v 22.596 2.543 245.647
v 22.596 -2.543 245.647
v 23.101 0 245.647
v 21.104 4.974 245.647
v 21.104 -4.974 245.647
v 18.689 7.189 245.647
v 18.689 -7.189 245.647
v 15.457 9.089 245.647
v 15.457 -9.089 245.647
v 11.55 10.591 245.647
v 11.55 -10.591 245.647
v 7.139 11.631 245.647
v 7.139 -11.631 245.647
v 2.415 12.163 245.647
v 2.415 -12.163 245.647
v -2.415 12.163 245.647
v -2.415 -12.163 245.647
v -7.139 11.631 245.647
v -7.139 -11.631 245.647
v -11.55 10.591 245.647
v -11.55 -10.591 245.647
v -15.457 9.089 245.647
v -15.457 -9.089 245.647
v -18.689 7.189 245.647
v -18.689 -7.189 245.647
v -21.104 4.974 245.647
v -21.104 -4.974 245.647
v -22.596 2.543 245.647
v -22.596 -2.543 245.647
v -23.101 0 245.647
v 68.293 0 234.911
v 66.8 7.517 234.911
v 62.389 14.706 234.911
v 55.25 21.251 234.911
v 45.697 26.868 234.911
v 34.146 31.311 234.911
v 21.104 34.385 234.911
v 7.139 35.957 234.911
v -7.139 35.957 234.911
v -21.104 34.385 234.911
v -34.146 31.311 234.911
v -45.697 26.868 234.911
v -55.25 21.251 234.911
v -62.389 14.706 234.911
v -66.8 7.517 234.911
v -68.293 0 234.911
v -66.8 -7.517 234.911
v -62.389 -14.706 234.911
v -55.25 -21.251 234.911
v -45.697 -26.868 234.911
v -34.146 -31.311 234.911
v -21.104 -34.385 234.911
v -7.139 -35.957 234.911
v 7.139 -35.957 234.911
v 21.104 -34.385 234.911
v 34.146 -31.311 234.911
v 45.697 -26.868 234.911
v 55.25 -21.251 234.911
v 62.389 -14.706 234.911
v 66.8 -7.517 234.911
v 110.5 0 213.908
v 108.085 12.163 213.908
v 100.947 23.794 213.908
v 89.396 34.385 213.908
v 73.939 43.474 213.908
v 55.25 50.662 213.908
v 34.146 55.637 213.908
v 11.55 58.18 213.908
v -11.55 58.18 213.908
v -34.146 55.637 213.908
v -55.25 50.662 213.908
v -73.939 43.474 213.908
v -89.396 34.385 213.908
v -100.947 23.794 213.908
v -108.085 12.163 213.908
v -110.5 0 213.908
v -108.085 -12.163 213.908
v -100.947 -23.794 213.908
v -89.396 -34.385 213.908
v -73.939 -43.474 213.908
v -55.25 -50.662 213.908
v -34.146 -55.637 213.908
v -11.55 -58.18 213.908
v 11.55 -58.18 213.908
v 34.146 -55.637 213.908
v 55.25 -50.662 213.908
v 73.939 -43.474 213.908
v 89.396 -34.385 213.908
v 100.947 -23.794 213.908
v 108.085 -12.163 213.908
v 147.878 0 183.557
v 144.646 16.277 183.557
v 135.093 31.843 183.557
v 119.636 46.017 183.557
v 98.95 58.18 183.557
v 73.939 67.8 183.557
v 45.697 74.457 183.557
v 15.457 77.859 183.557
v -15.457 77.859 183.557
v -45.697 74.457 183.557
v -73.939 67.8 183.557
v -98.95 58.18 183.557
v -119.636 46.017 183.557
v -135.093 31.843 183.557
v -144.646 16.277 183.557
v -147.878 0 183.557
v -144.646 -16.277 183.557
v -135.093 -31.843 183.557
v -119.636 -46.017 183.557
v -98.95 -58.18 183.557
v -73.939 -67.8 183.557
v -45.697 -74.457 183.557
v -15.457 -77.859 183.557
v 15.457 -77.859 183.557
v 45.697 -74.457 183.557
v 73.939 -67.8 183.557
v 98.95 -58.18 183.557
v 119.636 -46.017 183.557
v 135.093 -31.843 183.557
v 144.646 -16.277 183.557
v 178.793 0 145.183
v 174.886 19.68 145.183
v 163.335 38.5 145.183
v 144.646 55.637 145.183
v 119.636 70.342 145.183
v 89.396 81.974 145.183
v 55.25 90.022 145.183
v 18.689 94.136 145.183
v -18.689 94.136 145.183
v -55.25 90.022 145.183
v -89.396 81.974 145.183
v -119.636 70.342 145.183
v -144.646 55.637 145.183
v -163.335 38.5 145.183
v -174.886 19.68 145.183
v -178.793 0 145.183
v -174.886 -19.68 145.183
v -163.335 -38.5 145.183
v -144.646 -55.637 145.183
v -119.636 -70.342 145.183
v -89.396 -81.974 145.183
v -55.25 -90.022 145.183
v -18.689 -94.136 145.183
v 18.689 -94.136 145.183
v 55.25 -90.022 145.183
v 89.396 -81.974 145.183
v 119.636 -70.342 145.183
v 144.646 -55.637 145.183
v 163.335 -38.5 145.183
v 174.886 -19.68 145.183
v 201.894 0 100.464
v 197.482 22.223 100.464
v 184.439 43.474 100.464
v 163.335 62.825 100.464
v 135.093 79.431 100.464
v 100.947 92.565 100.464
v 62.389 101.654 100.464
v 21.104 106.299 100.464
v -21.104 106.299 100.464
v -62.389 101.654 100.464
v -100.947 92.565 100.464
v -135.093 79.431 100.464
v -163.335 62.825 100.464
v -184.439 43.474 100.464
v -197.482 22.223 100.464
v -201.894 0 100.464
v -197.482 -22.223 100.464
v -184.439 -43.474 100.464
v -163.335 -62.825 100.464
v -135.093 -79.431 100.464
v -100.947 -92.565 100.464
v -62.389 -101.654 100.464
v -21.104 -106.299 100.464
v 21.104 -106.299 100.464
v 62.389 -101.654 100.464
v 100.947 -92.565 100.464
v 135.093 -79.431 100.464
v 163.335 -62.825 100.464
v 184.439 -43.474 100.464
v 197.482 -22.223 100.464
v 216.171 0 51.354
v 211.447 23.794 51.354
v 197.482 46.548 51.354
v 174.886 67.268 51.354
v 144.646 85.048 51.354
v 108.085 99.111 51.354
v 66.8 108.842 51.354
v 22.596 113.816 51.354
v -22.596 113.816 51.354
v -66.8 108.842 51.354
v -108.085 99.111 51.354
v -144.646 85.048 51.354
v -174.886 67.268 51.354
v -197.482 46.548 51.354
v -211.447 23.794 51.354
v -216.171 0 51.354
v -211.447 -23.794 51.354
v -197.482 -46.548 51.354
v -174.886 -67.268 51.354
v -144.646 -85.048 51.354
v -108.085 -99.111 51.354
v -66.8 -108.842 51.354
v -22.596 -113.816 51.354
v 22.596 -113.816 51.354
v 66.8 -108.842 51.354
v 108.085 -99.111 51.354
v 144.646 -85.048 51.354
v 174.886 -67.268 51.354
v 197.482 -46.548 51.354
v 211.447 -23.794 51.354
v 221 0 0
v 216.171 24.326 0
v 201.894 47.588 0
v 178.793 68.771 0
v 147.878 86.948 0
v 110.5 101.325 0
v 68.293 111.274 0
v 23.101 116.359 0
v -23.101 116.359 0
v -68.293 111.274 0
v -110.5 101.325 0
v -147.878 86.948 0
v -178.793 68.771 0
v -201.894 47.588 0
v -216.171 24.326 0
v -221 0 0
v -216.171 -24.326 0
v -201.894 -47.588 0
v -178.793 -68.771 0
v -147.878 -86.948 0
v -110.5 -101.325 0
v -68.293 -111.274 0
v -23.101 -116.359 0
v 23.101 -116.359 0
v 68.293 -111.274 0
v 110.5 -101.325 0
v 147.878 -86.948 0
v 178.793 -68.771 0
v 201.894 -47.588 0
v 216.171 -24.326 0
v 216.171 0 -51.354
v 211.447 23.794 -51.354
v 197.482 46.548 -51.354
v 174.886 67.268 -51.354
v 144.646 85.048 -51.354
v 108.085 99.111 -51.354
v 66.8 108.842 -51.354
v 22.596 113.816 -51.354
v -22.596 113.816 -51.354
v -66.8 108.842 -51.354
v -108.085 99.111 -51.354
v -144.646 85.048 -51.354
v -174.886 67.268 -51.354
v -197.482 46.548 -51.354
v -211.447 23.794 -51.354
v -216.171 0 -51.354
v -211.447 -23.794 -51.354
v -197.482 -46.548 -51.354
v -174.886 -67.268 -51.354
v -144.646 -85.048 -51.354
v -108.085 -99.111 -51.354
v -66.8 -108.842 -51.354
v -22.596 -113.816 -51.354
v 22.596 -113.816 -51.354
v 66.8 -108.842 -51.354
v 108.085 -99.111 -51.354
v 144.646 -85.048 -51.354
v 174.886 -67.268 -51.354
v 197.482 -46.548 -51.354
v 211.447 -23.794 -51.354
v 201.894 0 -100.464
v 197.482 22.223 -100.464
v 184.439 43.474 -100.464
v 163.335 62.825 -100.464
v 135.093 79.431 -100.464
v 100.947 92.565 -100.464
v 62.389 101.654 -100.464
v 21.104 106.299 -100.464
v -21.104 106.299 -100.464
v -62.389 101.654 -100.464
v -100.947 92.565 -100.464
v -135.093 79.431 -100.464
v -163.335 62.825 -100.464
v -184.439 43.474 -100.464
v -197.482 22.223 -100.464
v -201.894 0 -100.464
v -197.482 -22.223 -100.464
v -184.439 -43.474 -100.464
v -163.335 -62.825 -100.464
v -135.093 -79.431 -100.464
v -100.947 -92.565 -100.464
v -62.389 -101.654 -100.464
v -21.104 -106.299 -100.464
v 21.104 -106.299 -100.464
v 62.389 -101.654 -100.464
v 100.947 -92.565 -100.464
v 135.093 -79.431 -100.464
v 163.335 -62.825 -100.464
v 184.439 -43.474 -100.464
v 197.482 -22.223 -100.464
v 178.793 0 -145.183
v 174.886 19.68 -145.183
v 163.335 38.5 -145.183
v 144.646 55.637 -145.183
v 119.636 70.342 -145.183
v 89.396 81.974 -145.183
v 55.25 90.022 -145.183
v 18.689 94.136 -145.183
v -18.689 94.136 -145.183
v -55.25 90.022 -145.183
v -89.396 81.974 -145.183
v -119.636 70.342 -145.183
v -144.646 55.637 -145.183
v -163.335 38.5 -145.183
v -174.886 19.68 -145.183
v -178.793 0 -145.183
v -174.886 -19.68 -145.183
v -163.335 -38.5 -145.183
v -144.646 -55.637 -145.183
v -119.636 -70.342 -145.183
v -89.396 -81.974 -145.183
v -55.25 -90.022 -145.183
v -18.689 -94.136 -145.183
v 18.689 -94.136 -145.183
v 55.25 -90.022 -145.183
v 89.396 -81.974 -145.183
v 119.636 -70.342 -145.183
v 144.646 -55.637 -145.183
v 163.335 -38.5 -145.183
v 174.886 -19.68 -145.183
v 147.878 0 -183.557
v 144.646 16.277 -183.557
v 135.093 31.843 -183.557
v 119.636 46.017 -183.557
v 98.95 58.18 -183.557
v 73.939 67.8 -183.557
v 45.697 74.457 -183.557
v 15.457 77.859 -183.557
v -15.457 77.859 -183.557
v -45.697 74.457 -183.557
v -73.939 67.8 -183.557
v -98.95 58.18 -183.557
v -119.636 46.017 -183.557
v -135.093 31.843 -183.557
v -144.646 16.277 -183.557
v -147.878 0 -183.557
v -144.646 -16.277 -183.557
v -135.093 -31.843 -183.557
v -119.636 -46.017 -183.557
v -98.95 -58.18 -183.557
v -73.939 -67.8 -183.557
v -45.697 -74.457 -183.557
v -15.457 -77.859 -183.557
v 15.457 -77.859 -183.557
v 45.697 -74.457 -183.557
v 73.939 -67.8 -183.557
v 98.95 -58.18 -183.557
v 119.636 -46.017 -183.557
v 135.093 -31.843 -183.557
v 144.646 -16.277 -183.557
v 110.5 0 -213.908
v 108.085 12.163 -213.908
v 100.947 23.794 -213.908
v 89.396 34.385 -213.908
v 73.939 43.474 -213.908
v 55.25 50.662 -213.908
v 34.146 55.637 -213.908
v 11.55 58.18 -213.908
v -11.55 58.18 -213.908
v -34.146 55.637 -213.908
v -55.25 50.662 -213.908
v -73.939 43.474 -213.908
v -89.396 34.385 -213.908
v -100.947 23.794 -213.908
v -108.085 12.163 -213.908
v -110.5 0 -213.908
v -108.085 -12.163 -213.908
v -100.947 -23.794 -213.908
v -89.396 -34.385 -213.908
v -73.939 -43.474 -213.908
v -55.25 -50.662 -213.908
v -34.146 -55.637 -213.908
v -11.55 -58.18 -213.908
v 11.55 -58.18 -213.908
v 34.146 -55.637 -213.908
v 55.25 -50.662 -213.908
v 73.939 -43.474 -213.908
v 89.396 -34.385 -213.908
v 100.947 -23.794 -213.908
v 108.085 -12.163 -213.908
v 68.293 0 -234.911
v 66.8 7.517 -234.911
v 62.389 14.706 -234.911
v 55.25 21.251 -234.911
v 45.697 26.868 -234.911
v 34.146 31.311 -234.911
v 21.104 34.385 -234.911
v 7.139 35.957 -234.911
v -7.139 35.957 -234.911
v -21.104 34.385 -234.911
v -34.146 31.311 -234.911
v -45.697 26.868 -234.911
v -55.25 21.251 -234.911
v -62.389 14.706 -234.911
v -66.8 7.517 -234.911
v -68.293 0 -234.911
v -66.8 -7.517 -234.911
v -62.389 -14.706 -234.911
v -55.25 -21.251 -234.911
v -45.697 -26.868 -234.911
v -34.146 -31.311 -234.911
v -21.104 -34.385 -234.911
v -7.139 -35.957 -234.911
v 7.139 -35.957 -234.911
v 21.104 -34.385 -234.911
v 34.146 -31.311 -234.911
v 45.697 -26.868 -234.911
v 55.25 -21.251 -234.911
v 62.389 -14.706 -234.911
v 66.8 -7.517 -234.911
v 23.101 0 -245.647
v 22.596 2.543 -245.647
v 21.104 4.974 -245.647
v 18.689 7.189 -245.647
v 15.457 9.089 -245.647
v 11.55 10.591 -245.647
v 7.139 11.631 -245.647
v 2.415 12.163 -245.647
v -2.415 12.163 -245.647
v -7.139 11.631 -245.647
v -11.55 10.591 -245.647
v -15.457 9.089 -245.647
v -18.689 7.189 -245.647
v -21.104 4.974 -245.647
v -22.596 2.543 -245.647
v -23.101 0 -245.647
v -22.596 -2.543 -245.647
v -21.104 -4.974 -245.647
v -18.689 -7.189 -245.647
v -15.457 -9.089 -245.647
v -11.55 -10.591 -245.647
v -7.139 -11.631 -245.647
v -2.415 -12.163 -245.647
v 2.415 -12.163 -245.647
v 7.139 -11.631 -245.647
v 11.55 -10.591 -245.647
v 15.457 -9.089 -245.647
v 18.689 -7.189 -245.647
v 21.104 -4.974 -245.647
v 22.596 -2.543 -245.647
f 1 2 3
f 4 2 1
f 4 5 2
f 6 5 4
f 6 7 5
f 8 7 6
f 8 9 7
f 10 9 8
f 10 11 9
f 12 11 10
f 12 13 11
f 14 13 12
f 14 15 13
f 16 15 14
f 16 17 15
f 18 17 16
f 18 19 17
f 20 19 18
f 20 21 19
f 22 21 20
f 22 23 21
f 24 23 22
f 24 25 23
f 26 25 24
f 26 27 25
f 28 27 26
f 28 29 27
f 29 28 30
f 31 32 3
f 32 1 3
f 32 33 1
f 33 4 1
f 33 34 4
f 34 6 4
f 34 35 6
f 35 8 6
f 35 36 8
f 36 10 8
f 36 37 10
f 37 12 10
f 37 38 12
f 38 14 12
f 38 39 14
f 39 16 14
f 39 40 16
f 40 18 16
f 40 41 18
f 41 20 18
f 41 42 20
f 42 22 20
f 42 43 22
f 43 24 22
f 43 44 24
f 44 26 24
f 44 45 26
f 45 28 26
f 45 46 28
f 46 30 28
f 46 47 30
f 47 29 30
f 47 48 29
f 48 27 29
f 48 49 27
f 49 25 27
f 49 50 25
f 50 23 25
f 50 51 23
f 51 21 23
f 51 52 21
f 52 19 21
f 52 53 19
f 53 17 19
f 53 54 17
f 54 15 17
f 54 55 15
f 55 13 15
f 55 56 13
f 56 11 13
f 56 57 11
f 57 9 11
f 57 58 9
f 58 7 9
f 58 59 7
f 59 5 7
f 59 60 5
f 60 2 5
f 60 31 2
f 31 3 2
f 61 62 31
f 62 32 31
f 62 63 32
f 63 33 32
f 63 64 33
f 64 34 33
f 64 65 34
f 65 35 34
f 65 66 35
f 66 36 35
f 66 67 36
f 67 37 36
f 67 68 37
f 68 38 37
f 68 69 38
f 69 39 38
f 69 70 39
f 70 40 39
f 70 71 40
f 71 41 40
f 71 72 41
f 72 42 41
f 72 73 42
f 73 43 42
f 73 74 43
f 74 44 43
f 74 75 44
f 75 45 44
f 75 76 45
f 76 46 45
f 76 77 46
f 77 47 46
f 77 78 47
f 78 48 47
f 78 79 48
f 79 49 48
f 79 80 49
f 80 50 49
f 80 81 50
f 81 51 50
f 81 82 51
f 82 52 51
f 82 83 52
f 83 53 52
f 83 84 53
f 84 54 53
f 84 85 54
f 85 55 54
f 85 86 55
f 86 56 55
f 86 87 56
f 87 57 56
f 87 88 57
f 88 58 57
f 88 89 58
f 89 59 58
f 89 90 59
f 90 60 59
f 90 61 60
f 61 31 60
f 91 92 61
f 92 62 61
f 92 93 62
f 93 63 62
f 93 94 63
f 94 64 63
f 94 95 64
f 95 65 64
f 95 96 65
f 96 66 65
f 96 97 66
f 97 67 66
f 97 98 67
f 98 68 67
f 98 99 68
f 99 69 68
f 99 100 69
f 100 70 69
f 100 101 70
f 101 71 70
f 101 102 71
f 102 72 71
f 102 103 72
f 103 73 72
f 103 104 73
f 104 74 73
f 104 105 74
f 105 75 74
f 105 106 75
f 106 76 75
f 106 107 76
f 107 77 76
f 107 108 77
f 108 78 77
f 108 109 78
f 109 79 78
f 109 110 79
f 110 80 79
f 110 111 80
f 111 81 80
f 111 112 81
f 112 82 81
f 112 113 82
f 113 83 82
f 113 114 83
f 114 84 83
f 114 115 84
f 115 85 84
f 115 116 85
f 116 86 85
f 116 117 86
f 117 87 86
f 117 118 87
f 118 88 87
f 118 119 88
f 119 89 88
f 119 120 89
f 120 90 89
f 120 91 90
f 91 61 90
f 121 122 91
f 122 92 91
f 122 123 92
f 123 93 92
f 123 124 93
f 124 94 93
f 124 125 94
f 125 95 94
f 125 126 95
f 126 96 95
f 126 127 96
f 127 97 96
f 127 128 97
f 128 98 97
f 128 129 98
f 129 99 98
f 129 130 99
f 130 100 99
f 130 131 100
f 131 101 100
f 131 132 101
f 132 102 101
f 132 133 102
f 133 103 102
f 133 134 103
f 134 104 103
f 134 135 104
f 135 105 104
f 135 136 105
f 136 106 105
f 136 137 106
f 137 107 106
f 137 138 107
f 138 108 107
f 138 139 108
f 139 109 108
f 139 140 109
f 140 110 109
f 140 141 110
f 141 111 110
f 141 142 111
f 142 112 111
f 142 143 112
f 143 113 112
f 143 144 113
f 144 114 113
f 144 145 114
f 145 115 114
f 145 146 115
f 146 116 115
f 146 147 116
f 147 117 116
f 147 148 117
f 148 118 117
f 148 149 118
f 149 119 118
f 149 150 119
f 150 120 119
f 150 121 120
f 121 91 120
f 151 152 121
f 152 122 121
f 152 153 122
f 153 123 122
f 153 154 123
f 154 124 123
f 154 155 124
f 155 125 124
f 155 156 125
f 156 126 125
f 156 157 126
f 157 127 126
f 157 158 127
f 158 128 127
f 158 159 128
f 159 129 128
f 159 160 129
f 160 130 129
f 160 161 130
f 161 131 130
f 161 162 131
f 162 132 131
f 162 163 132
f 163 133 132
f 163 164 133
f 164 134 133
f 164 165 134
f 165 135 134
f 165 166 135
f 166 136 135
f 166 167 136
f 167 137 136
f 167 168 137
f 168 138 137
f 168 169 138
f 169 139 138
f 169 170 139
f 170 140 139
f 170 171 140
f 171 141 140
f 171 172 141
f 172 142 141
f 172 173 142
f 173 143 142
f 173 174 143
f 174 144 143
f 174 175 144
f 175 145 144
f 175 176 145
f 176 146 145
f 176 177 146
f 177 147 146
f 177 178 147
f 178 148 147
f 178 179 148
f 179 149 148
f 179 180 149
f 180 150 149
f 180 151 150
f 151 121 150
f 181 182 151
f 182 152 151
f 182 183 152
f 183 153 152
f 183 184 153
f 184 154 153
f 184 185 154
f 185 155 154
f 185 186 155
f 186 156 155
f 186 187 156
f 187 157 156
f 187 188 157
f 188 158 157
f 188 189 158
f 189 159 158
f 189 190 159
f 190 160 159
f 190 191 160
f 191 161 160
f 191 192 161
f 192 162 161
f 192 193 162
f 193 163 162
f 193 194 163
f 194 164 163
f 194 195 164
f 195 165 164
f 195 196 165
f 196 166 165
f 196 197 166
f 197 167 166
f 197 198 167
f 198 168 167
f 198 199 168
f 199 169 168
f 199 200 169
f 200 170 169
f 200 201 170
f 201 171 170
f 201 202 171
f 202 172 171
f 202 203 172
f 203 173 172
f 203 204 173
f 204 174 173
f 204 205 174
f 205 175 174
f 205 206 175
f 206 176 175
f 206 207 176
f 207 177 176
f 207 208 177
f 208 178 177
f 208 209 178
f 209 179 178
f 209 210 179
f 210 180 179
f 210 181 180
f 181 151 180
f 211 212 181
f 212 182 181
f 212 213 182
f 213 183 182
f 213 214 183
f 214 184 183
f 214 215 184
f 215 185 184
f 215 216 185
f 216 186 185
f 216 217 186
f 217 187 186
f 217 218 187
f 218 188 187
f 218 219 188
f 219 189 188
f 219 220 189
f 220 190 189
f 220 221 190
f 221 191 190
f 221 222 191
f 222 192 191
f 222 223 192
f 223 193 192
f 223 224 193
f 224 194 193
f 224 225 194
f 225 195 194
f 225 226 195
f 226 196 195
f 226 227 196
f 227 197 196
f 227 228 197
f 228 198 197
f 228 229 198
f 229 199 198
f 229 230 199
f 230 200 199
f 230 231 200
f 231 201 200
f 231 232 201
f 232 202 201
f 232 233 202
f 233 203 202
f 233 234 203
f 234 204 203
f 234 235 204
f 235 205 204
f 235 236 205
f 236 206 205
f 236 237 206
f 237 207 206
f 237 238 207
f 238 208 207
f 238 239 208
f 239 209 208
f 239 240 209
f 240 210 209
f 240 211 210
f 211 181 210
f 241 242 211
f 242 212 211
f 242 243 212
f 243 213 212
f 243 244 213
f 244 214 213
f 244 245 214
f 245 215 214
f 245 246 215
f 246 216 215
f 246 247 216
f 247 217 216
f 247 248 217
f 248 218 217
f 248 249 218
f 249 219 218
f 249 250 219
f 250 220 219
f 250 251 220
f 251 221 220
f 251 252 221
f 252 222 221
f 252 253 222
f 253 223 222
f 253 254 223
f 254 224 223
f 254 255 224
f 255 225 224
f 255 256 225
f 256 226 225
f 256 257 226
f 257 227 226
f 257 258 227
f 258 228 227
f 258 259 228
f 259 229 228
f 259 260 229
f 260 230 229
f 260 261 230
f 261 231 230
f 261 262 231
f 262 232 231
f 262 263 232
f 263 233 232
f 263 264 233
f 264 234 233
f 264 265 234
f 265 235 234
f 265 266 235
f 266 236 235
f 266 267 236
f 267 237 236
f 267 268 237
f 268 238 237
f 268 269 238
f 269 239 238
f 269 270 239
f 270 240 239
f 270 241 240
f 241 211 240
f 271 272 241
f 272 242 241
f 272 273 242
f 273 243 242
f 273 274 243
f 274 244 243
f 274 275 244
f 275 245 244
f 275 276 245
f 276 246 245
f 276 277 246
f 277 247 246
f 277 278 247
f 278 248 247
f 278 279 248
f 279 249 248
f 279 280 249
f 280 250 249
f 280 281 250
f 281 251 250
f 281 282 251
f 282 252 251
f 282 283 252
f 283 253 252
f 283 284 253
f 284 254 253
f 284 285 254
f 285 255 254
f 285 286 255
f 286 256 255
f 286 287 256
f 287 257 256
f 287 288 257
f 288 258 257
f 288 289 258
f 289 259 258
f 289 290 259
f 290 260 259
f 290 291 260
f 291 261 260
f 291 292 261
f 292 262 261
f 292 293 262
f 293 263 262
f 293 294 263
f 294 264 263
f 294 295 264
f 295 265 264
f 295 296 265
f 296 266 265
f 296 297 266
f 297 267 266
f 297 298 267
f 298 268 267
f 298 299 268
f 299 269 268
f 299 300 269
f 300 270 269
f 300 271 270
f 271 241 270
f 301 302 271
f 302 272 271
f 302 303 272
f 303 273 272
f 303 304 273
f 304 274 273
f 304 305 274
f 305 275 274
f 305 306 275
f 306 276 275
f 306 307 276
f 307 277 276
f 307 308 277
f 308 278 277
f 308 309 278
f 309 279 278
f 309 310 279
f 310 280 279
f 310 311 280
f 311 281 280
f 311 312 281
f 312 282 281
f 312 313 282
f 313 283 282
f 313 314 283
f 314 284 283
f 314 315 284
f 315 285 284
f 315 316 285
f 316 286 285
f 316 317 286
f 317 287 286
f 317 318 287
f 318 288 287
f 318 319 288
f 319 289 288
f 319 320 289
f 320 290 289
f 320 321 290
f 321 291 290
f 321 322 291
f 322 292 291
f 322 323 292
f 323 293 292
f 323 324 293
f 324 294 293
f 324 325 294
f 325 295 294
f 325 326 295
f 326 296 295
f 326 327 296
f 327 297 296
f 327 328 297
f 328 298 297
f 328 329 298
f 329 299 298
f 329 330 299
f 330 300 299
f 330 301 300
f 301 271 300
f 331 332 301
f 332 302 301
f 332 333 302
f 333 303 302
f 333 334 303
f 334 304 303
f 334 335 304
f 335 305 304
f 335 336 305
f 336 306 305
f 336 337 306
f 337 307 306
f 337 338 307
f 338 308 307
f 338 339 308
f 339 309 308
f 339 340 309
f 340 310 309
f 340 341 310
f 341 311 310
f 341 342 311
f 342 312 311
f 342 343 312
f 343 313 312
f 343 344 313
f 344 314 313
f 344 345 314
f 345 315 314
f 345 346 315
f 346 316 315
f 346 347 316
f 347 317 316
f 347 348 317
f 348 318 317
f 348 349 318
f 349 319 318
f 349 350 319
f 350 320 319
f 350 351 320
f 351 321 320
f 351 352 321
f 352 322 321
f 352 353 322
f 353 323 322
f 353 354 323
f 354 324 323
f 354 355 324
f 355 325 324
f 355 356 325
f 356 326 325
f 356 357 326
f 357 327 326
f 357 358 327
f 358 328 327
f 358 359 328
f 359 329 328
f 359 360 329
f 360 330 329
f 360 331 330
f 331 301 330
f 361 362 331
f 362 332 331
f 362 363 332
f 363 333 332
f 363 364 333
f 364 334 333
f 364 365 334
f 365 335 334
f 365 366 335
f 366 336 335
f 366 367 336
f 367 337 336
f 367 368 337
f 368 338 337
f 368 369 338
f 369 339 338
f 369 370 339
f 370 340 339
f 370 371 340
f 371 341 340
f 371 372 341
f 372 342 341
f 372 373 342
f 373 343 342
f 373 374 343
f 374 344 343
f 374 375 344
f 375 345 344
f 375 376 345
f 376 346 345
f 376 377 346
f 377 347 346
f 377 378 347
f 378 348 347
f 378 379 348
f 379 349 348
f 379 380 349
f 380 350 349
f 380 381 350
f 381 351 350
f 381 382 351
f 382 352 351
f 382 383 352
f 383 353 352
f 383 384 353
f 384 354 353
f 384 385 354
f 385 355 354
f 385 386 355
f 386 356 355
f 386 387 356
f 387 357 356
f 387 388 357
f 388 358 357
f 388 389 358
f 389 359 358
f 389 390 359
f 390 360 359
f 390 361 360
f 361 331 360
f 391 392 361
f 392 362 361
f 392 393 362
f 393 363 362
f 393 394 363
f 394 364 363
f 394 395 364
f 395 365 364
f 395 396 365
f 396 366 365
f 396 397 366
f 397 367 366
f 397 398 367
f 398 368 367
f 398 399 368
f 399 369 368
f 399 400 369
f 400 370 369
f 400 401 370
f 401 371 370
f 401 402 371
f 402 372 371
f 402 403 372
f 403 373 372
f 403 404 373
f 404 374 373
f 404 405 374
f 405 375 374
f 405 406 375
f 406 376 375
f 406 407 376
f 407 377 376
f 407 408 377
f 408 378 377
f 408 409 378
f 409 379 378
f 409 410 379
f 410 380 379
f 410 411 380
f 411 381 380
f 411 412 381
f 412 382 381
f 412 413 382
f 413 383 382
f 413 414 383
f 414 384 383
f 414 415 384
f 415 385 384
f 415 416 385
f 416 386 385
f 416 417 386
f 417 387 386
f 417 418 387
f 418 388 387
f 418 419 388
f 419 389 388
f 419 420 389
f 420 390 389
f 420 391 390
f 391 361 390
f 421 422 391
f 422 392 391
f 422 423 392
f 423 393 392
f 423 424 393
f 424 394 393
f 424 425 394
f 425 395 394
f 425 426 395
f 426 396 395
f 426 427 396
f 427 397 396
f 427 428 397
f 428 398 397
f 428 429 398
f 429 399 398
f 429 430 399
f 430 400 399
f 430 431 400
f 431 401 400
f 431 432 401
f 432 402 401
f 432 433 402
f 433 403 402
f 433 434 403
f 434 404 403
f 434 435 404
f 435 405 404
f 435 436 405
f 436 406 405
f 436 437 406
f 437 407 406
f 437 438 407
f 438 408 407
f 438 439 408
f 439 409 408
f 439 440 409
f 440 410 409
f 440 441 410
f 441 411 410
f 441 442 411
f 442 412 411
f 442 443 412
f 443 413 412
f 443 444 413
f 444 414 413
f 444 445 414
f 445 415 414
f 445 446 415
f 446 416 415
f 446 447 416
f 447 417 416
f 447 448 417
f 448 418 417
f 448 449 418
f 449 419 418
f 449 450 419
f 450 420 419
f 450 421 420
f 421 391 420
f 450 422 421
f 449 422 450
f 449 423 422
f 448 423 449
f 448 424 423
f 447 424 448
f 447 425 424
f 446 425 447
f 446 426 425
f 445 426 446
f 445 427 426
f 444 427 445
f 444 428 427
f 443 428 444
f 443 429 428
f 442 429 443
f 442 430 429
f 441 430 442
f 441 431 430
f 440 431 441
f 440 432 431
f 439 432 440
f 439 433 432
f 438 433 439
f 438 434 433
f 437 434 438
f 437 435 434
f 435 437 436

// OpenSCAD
// Generated by SolidPython 1.0.1 on 2020-07-29 00:46:53


scale(v = [17, 9, 19]) {
	sphere(r = 13);
}
/***********************************************
*********      SolidPython code:      **********
************************************************
 
# import packages: SolidPython
from solid import *
from solid.utils import *
from itertools import chain, combinations, permutations


class Resize:

    def __init__(self, scad_file):
        self.scad_file = scad_file
        #self.scad_file = import_scad(scad_file)
        # cone/cylinder param:
        self.r1 = 0
        self.r2 = 0
        self.h = 0
        # rectangular prism param:
        self.w = 0
        self.l = 0
        # ellipse param:
        self.r = 0

    # import OpenScad code (file name corresponds to shape)


    # classify shape + parameters
    def assign(self, param1, param2, param3):
        if self.scad_file == 'cone.scad':
            self.r1 = param1
            self.r2 = param2
            self.h = param3
        elif self.scad_file == 'cylinder.scad':
            self.r1 = param1
            self.r2 = param2
            self.h = param3
        elif self.scad_file == 'rectangularPrism.scad':
            self.h = param1
            self.l = param2
            self.w = param3
        else:
            self.r = param1
            self.h = param2

    # resize parameters
    def iterate(self):
        x = range(3, 20, 2)
        i = 1
        if self.scad_file == 'cone.scad':
            tempList = list(permutations(x, 2))
            for temp in tempList:
                param1 = temp[0]
                param2 = temp[1]
                filepath = 'produced_scad_files/' + 'cone' + str(param1) + '_' + str(param2) + '_' + '.scad'
                scad_render_to_file(cylinder(h=param1, r1=param2, r2=0), filepath)

        elif self.scad_file == 'cylinder.scad':
            tempList = list(permutations(x, 3))
            for temp in tempList:
                param1 = temp[0]
                param2 = temp[1]
                filepath = 'produced_scad_files/' + 'cylinder' + str(param1) + '_' + str(param2) + '_' + '.scad'
                scad_render_to_file(cylinder(h=param1, r1=param2, r2=param2), filepath)

        elif self.scad_file == 'rectangularPrism.scad':
            tempList = list(permutations(x, 3))
            for temp in tempList:
                param1 = temp[0]
                param2 = temp[1]
                param3 = temp[2]
                filepath = 'produced_scad_files/' + 'rectangularPrism' + str(param1) + '_' + str(param2) + '_' + str(
                    param3) + '.scad'
                scad_render_to_file(cube(size=(param1, param2, param3)), filepath)

        elif self.scad_file == 'ellipse.scad':
            tempList = list(permutations(x, 4))
            for temp in tempList:
                param1 = temp[0]
                param2 = temp[1]
                param3 = temp[2]
                param4 = temp[3]
                filepath = 'produced_scad_files/' + 'ellipse' + str(param1) + '_' + str(param2) + '_' + str(param3) + '_' + str(param4) + '.scad'
                scad_render_to_file(scale([param1, param2, param3])(sphere(r=param4)), filepath)

    def render_to_scadfile(self):
        scad_render_to_file(scad, 'example.scad') 
 
************************************************/
